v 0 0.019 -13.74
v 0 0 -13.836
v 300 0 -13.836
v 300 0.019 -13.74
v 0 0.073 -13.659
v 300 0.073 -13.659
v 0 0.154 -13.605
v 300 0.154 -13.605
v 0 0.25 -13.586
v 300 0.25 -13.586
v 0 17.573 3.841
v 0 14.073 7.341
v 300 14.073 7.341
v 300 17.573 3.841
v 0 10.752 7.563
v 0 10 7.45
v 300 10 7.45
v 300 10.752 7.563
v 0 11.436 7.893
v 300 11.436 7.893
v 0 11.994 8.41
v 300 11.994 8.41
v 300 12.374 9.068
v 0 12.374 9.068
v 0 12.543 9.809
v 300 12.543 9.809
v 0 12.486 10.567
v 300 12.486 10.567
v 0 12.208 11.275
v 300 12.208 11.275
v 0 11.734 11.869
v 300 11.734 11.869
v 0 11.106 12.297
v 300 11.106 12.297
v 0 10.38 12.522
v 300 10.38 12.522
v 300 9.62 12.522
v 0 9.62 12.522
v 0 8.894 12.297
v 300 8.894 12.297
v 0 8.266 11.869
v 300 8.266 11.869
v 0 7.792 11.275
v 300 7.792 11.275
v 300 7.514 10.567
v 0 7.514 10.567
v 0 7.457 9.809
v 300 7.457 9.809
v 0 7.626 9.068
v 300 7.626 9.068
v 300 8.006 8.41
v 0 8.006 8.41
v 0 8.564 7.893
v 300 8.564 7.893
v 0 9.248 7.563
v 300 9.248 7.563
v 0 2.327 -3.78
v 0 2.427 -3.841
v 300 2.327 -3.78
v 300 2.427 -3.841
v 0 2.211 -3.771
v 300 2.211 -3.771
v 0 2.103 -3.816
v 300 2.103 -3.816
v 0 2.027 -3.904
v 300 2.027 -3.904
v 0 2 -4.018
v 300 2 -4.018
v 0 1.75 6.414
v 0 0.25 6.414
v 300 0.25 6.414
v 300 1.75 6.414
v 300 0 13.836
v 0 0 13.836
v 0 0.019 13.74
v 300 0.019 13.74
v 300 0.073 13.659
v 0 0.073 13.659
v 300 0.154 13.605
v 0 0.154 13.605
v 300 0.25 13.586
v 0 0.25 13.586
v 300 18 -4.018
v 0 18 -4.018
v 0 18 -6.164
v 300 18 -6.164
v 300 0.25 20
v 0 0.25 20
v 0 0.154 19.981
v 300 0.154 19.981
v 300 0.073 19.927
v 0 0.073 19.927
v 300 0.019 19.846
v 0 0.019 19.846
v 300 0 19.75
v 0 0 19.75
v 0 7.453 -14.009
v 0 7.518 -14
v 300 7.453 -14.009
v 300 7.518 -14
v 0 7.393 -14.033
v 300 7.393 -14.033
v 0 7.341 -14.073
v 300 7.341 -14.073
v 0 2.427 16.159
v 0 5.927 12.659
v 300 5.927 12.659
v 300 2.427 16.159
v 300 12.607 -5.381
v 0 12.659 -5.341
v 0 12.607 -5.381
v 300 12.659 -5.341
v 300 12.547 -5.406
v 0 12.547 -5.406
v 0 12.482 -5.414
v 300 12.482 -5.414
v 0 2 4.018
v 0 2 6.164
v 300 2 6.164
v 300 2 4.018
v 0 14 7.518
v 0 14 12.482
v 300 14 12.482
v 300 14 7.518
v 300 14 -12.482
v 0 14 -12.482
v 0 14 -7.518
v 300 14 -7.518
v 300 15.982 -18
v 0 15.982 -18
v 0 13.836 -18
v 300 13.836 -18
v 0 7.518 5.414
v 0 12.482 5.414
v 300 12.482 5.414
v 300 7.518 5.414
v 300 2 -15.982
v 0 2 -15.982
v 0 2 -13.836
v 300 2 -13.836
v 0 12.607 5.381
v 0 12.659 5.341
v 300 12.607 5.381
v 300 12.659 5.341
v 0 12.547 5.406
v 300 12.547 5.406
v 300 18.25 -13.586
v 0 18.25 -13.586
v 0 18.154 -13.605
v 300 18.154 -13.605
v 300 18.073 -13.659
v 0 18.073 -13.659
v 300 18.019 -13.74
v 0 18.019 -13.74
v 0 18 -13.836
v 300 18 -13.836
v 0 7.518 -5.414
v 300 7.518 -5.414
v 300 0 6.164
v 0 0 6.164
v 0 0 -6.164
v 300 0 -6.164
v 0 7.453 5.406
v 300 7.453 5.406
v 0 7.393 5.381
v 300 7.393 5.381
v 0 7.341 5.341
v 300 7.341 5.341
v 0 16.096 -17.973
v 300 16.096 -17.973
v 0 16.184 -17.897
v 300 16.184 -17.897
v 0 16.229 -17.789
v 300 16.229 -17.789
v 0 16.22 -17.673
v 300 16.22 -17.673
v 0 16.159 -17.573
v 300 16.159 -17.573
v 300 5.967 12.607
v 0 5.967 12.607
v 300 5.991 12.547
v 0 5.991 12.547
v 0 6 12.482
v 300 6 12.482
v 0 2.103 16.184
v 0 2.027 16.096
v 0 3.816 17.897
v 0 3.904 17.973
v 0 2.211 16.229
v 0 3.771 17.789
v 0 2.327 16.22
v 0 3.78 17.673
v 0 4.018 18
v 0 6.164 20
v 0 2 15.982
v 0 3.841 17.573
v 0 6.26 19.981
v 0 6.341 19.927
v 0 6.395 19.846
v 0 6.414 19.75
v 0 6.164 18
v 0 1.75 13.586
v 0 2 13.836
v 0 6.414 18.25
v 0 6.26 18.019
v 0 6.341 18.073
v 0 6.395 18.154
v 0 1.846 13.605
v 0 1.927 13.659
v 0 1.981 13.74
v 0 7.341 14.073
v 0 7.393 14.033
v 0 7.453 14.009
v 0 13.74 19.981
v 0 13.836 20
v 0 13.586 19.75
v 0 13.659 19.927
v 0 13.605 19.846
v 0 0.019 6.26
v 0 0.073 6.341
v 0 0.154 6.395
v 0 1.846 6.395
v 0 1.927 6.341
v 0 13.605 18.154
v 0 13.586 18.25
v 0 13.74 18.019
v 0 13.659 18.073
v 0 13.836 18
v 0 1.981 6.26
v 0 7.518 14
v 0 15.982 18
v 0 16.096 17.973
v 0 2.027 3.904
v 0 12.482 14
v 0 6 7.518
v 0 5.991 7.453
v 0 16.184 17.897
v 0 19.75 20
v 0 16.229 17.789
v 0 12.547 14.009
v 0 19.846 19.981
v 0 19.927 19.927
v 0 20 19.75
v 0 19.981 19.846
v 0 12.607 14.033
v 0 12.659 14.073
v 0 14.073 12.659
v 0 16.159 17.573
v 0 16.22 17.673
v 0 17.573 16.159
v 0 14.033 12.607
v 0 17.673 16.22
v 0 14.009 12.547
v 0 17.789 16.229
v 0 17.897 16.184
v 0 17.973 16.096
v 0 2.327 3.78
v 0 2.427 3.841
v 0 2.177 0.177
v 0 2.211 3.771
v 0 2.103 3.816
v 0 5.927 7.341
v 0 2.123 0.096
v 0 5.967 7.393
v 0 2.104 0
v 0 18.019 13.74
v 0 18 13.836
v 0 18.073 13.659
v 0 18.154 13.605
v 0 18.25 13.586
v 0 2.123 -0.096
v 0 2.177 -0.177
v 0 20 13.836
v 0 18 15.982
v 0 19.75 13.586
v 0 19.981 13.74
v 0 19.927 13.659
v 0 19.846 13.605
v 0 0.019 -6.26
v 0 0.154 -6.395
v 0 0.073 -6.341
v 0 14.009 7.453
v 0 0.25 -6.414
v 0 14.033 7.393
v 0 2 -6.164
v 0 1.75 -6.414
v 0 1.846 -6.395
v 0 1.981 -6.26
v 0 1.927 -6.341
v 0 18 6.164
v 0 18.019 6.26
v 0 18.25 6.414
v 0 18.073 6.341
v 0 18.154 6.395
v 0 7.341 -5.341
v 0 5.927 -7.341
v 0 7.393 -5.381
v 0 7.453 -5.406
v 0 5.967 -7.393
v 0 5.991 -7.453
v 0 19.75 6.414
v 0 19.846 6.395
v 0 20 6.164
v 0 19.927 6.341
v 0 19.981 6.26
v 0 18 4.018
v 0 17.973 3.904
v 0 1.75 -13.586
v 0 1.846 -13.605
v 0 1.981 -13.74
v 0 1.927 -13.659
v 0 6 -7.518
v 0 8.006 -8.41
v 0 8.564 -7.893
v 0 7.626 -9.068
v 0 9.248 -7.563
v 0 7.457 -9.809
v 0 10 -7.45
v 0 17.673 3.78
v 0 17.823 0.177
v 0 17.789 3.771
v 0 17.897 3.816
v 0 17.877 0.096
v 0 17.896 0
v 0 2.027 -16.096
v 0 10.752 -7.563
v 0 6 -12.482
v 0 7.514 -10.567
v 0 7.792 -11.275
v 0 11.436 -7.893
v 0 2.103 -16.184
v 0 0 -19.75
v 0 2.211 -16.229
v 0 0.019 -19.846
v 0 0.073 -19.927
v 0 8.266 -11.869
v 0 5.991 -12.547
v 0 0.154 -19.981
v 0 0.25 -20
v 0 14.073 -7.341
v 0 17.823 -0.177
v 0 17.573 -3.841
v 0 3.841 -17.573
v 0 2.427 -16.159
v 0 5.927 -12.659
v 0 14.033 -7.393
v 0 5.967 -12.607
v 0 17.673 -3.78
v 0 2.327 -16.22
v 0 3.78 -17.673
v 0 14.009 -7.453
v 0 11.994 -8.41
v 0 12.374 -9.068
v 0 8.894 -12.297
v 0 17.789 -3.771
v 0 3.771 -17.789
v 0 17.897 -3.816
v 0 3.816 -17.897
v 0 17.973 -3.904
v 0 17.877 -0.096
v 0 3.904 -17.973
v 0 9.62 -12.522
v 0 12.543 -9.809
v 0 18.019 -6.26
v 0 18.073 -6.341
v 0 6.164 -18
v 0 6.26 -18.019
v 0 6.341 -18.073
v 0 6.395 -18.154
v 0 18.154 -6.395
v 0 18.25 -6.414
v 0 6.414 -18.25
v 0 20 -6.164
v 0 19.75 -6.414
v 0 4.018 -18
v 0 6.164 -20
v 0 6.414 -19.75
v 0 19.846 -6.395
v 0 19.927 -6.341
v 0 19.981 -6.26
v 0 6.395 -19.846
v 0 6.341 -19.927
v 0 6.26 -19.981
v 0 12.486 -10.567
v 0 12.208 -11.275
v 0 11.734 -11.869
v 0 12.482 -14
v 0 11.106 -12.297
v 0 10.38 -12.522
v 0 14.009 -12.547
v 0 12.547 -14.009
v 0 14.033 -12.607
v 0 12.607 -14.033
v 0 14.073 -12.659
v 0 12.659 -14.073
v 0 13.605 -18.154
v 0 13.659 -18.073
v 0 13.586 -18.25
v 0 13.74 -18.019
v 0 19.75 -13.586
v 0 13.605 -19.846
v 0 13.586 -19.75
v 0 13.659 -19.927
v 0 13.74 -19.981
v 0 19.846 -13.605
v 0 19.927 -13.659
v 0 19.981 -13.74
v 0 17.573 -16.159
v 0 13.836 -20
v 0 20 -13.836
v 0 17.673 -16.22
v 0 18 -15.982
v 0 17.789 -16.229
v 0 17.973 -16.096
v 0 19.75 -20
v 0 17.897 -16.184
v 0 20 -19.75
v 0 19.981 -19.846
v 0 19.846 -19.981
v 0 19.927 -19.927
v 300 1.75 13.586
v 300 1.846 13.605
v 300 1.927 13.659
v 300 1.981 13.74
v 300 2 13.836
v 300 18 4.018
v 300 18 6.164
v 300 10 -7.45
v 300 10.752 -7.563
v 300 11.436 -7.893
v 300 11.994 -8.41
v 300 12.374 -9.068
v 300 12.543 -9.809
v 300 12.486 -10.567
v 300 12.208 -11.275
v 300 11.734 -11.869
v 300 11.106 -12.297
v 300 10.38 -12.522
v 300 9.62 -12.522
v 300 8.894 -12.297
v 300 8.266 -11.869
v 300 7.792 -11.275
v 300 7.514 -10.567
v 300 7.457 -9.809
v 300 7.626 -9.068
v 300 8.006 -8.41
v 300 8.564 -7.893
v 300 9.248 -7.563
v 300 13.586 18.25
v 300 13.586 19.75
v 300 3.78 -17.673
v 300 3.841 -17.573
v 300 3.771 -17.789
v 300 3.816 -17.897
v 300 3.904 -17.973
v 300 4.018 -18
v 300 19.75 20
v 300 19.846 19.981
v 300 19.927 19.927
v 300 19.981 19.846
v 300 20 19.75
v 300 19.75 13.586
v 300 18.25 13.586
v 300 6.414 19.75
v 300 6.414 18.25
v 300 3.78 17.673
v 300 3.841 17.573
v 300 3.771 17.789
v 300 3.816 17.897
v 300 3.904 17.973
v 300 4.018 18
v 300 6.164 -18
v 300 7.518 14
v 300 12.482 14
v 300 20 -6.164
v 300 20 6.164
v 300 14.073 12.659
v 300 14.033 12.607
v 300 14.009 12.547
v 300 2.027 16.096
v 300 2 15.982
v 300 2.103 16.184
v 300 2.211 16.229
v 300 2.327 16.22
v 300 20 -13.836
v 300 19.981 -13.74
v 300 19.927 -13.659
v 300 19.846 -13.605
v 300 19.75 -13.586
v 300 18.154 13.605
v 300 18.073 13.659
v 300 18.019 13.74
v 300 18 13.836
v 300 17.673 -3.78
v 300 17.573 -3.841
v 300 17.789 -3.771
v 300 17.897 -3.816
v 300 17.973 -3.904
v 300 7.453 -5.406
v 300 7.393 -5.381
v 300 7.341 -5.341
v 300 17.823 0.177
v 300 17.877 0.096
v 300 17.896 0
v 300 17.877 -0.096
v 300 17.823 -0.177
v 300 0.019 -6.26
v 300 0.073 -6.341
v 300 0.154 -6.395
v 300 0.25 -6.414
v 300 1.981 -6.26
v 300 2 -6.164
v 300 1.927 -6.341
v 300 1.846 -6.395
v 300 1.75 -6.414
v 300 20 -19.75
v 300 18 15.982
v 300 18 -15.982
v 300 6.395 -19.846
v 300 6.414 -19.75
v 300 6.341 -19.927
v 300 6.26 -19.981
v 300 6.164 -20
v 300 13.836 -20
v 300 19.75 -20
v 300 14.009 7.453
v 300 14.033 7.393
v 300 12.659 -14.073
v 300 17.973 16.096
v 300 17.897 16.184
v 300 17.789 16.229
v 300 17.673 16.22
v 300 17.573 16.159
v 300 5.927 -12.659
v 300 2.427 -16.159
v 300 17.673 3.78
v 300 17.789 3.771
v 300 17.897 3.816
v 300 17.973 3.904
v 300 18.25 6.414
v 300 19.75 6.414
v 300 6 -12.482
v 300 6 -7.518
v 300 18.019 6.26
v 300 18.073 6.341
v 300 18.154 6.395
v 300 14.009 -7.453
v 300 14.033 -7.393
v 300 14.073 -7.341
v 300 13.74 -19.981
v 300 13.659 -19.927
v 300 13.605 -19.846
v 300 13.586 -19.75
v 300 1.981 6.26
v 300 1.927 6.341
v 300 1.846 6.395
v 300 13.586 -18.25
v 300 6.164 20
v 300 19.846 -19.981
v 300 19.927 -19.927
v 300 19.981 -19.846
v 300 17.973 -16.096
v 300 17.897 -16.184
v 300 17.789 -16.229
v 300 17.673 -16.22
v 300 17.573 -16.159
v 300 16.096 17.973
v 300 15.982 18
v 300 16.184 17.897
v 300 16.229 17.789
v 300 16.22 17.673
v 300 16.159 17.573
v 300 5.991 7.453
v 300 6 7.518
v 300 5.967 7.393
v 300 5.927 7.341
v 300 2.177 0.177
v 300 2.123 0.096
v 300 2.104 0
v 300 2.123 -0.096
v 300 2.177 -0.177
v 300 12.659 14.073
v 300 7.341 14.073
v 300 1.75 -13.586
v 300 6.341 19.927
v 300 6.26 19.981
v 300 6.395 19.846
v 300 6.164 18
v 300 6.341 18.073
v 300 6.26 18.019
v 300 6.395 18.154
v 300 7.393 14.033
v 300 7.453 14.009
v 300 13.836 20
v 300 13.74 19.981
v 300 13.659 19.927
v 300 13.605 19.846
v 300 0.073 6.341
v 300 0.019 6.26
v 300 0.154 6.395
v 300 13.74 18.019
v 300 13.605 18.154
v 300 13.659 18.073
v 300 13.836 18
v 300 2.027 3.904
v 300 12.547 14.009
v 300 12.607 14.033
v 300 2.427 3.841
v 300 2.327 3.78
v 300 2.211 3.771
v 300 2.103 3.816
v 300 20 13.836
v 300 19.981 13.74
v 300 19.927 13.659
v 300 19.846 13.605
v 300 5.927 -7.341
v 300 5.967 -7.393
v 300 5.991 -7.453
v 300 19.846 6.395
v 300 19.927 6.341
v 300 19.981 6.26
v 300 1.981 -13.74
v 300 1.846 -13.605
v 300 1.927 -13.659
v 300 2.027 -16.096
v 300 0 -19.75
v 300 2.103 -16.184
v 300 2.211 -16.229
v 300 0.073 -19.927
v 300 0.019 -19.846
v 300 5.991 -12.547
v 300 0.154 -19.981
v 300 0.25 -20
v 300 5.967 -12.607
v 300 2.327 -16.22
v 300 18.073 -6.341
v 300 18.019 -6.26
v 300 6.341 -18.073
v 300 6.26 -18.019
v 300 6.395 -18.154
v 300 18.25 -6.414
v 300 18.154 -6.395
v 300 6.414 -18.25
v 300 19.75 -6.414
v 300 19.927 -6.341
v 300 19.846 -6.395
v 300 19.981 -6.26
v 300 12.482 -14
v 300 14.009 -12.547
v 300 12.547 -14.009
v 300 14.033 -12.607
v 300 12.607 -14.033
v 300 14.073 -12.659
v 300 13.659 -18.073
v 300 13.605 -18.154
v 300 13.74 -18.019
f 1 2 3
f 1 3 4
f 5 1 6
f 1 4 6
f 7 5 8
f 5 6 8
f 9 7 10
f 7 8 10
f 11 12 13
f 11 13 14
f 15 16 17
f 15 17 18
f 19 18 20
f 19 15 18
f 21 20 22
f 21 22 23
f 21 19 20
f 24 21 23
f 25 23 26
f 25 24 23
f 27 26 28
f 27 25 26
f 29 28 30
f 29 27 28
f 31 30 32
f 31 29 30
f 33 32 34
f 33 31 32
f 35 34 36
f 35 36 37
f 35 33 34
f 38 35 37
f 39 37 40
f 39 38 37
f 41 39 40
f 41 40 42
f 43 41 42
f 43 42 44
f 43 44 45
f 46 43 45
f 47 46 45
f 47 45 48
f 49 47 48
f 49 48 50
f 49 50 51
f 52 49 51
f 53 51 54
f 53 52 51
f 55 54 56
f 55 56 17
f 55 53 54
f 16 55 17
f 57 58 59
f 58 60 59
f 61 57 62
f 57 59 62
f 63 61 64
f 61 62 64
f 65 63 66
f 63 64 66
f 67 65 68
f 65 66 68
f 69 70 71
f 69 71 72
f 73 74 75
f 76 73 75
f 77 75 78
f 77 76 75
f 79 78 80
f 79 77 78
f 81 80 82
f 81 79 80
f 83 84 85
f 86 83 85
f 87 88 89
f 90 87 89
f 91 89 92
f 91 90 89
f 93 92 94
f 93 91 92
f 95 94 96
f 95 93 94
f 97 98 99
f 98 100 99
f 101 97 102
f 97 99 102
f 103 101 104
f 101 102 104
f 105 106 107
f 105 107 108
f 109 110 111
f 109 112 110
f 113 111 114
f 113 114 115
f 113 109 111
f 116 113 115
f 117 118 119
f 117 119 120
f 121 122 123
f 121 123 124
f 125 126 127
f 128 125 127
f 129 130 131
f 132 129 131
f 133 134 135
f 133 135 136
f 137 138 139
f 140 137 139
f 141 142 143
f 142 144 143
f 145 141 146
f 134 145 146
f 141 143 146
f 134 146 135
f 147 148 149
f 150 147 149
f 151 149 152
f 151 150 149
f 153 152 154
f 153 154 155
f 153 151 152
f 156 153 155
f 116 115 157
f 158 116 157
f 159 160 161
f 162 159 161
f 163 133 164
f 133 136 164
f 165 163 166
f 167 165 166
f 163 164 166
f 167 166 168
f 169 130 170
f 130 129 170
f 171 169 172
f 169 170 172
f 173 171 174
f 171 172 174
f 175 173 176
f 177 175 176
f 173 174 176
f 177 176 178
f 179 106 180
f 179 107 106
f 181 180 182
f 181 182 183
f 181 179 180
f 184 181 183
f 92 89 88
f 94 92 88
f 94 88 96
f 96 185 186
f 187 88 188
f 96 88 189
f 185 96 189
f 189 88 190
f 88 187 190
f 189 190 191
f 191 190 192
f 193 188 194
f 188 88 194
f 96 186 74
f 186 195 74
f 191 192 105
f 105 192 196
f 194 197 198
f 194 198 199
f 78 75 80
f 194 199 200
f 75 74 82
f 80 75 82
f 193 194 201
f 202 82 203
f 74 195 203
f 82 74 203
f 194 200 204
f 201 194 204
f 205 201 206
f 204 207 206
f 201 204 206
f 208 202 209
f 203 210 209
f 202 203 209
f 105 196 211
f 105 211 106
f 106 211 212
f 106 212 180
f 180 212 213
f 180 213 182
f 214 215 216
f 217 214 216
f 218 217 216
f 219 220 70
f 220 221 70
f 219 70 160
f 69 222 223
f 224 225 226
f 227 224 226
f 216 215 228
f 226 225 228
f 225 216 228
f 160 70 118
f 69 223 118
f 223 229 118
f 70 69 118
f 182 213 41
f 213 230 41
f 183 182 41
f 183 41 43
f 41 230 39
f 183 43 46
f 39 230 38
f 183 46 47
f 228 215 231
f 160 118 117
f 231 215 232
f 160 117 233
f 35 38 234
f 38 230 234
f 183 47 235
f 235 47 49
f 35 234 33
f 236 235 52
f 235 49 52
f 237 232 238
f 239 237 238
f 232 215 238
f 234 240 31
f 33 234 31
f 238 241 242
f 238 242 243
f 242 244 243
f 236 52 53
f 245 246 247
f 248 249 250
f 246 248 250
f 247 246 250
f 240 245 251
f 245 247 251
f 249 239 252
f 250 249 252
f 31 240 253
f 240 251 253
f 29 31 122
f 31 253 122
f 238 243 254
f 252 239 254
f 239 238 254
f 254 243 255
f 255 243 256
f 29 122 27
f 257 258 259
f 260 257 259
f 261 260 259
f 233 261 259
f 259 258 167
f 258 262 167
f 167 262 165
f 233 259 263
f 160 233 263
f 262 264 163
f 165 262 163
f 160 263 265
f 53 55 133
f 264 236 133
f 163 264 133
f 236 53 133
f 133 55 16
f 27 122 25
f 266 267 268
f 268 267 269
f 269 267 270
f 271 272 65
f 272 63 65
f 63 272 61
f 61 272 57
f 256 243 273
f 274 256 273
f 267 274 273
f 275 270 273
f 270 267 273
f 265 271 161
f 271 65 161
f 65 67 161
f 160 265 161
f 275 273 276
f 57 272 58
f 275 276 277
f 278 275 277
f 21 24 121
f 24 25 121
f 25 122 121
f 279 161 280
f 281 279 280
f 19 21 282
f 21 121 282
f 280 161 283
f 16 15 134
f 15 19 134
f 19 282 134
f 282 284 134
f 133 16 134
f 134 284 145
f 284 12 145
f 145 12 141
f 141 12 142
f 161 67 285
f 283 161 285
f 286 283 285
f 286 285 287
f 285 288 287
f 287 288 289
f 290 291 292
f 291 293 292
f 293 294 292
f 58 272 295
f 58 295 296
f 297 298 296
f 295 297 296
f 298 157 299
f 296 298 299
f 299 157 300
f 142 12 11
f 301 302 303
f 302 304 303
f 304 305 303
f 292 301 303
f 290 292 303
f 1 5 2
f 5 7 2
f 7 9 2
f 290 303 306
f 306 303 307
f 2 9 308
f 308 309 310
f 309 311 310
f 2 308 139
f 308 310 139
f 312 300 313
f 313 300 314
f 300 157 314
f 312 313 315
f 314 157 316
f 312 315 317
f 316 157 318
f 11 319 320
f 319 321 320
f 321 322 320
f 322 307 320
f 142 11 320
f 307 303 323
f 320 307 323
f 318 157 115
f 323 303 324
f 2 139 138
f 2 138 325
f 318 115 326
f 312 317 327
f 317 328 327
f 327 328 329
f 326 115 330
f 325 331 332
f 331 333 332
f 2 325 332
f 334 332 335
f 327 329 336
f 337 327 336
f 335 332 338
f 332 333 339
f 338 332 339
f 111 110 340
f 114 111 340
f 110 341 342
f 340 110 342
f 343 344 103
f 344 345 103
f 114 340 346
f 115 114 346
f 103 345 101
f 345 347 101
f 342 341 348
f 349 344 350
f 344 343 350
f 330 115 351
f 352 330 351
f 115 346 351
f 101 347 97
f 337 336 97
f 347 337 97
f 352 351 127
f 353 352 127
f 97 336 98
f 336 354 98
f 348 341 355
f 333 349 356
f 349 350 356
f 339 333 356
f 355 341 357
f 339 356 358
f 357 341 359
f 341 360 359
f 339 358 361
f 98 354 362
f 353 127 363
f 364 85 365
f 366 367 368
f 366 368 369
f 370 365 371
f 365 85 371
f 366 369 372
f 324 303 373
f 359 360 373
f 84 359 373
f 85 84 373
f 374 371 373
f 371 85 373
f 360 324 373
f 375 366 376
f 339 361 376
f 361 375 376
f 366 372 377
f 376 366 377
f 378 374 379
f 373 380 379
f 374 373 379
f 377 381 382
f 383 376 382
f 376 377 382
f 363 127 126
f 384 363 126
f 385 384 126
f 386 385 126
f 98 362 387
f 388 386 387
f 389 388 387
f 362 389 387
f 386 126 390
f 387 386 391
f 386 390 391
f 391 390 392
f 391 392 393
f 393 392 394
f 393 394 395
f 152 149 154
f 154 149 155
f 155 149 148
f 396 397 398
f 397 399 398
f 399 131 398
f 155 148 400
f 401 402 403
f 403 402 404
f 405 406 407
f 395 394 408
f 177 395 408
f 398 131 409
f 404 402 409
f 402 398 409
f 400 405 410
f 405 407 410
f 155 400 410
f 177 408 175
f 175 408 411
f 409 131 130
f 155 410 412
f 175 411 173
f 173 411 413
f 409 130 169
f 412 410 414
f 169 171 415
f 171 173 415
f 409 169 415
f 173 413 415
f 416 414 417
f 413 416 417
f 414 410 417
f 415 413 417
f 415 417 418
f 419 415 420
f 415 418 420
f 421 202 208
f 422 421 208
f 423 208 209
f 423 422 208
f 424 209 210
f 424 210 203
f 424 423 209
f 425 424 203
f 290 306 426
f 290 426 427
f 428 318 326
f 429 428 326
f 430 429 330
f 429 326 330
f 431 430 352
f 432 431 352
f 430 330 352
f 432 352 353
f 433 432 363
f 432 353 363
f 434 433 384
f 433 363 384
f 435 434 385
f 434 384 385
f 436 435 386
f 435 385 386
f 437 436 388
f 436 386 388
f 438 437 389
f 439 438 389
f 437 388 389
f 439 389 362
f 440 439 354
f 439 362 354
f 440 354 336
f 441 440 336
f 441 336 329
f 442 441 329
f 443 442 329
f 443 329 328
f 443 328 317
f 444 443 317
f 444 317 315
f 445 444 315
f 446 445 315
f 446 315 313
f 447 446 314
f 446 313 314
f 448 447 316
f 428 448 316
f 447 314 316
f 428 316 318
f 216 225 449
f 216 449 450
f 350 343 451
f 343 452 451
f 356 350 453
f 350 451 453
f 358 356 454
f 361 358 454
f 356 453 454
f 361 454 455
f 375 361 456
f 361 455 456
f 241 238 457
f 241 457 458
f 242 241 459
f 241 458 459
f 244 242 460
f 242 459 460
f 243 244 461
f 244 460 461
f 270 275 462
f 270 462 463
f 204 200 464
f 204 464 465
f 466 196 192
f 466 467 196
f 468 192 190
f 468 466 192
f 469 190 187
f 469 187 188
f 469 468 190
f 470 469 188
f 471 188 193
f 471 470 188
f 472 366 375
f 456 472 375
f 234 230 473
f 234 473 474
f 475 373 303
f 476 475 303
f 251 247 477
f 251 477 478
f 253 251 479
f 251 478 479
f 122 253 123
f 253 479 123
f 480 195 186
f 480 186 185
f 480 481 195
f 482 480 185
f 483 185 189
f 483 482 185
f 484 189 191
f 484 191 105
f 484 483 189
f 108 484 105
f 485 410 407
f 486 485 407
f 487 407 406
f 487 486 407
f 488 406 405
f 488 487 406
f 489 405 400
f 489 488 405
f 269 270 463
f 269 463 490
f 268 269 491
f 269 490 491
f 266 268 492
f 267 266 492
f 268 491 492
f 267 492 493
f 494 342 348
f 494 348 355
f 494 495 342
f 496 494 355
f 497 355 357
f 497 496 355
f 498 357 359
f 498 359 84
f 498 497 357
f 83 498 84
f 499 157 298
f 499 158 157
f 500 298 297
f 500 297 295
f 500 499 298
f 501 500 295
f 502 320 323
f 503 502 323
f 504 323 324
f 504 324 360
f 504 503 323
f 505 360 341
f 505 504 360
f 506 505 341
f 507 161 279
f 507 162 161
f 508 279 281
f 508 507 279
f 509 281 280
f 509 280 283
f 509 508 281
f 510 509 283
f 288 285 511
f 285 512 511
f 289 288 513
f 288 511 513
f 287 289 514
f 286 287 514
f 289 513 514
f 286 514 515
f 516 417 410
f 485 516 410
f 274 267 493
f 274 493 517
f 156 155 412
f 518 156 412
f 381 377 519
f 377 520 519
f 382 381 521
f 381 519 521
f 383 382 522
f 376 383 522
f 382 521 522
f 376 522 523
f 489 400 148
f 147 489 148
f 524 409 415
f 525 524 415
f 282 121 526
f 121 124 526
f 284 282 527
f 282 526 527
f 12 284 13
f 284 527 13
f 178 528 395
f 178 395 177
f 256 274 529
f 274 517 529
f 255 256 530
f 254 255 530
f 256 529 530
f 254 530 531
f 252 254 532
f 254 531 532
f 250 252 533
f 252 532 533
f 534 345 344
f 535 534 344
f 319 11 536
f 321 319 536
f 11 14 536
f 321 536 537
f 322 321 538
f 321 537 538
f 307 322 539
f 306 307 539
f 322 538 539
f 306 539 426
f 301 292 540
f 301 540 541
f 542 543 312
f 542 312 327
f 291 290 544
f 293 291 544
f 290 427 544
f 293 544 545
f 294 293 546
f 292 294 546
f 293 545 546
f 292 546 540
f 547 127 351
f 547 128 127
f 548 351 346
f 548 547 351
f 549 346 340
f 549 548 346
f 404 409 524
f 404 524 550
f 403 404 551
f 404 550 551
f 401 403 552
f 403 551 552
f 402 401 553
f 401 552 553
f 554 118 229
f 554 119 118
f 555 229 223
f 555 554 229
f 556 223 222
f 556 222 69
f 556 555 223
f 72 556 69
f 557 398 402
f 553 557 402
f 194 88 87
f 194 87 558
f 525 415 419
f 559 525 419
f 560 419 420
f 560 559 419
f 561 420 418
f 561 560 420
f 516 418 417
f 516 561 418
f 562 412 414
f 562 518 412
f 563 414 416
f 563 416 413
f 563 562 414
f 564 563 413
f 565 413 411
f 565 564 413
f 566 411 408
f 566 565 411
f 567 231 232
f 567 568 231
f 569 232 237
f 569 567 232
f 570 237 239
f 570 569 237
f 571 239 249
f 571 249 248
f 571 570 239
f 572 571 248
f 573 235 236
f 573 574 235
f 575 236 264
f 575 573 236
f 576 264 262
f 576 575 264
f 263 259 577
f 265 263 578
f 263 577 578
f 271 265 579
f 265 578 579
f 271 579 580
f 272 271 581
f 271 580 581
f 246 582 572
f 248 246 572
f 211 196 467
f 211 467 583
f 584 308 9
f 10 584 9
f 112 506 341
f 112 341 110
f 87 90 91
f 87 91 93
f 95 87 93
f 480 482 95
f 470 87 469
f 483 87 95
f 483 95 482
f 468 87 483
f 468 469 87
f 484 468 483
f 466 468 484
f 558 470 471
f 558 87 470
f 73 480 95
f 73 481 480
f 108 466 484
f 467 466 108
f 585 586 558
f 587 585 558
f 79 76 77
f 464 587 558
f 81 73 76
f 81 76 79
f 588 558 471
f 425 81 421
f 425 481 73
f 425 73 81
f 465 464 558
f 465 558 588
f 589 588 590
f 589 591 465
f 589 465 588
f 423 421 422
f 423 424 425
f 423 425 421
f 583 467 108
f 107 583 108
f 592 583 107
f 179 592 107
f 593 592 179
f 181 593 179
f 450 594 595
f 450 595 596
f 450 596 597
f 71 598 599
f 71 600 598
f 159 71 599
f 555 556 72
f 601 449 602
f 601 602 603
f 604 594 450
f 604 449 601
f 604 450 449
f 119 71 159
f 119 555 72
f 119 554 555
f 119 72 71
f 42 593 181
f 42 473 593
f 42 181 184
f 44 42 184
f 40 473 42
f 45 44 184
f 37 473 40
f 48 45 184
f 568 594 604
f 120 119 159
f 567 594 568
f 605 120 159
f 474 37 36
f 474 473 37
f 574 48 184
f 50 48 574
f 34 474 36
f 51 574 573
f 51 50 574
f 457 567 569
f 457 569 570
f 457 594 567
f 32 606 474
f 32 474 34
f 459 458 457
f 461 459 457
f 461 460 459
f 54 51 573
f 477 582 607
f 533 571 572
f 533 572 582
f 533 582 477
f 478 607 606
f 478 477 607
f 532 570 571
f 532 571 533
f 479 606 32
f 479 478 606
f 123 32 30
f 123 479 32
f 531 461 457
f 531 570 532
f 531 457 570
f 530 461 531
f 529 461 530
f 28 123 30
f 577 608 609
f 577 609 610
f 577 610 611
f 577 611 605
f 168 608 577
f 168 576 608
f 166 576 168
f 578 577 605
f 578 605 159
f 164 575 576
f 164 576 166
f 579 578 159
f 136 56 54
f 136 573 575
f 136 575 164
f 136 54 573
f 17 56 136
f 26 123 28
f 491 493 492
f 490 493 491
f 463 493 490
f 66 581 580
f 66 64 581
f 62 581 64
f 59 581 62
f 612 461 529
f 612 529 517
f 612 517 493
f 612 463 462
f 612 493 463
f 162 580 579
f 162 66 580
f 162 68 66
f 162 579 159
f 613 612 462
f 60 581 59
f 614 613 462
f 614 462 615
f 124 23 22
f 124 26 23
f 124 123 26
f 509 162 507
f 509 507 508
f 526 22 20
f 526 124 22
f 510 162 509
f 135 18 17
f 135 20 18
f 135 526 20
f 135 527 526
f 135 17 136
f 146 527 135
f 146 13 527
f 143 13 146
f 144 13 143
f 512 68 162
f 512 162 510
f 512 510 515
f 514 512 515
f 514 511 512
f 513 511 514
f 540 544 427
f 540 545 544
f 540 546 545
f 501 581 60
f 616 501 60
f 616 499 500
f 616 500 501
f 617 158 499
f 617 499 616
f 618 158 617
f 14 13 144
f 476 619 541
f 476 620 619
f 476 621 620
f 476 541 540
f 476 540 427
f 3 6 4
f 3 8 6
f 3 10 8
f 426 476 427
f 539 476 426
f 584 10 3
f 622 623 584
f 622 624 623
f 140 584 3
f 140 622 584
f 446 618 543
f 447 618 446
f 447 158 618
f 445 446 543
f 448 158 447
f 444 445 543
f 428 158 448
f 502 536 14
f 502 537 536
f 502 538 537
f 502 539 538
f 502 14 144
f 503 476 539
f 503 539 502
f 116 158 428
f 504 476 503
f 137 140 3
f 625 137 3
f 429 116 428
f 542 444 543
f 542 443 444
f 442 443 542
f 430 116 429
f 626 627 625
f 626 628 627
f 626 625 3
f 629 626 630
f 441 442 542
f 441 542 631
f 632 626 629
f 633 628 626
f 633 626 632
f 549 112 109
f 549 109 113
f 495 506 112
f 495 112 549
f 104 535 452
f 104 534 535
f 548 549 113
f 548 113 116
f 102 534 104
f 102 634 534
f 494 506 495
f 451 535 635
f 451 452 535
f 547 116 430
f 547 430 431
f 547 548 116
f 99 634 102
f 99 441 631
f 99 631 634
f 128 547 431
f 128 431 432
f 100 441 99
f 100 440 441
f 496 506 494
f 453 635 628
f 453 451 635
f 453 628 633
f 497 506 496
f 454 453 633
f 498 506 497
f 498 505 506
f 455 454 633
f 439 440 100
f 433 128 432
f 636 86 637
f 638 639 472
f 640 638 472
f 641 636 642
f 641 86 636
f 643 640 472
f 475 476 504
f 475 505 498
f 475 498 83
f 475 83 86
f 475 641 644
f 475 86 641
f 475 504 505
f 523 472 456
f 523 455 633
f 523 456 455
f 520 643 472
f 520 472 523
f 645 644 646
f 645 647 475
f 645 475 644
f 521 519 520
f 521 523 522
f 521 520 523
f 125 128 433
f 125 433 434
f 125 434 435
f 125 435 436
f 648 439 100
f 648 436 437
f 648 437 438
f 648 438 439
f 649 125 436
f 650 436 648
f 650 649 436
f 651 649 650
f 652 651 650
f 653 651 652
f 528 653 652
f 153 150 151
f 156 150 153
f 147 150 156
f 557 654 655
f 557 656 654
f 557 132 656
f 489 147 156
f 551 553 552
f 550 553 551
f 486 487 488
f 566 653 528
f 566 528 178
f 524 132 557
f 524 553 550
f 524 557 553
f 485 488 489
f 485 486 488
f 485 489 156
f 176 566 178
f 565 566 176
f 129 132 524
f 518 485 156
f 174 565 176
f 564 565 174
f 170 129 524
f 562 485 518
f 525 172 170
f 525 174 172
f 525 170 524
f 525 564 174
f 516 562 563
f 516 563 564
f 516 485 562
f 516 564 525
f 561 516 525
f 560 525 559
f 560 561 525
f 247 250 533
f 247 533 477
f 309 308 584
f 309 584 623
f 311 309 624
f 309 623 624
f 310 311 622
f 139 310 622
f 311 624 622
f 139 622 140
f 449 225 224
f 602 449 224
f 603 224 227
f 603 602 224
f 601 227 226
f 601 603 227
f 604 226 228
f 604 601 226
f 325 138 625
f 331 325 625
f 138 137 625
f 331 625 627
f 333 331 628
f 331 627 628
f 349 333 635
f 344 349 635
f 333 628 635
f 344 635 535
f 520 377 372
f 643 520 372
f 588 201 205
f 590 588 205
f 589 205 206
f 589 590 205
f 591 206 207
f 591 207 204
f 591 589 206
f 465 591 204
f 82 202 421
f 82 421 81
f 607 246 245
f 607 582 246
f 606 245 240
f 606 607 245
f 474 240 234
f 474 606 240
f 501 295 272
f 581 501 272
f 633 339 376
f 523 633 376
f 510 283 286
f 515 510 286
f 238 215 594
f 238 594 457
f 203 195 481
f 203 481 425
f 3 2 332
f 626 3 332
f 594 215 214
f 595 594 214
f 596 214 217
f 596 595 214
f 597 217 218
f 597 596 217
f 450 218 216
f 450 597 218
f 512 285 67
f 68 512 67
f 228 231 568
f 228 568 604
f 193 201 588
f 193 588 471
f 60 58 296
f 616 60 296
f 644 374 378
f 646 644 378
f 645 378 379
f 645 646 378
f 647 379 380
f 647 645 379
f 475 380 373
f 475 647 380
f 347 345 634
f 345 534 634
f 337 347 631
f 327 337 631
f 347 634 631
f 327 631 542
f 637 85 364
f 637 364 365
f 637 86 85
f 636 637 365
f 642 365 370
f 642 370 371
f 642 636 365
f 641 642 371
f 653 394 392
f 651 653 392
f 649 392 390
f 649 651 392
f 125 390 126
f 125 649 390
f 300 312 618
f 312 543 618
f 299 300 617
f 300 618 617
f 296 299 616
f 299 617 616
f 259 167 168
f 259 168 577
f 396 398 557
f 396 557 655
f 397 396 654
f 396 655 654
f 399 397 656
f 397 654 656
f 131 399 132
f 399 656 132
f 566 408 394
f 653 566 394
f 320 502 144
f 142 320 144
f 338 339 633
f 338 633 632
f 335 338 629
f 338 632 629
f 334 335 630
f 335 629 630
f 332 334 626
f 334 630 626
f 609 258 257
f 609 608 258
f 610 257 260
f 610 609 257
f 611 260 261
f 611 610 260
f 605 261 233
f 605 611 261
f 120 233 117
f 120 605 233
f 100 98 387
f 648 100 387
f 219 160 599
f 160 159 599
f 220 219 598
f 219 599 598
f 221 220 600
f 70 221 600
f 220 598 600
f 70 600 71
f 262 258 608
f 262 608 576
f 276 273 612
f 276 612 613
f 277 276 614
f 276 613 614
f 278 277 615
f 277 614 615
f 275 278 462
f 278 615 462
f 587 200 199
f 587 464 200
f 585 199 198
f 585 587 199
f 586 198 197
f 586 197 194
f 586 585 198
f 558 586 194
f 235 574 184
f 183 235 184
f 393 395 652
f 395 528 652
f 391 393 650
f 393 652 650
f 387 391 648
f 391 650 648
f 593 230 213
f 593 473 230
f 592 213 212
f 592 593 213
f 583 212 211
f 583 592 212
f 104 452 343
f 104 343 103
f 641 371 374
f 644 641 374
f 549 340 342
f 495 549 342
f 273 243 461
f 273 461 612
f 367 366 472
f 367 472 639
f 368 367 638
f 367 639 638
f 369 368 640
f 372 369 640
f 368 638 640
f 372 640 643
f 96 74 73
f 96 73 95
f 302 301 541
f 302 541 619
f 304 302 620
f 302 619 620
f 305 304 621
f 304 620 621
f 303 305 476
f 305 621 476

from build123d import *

# Parameters (mm, degrees)
SKETCH2_R           = 2.55
BOSS_EXTRUDE2_DEPTH = 300
FILLET1_R           = 0.25
FILLET2_R           = 0.25


with BuildPart() as part:
    # Sketch2 → Boss-Extrude2 (new body)
    with BuildSketch(Plane(origin=(0, 0, 0), x_dir=(0, 0, -1), z_dir=(1, 0, 0))):
        Polygon((-20, 13.585786438), (-20, 20), (-13.585786438, 20), (-13.585786438, 18), (-16.585786438, 18), (-12.58578916, 14), (-7.41421084, 14), (-3.414213562, 18), (-6.414213562, 18), (-6.414213562, 20), (0, 20), (0, 18), (-5.414207154, 12.58578916), (-5.414207154, 7.41421084), (0, 2), (0, 0), (-6.414213562, 0), (-6.414213562, 2), (-3.414213562, 2), (-7.41421084, 6), (-12.58578916, 6), (-16.585786438, 2), (-13.585786438, 2), (-13.585786438, 0), (-20, 0), (-20, 6.414213562), (-18, 6.414213562), (-18, 3.414213562), (-14.000005445, 7.41421084), (-14.000005445, 12.58578916), (-18, 16.585786438), (-18, 13.585786438), align=None)
        with Locations((-10, 10)):
            Circle(SKETCH2_R, mode=Mode.SUBTRACT)
    extrude(amount=BOSS_EXTRUDE2_DEPTH)

    # Fillet1
    fillet1_edges = [part.edges().sort_by_distance(p)[0] for p in [
        (150, 13.585786438, 20),
        (150, 20, 20),
        (150, 20, 13.585786438),
        (150, 18, 13.585786438),
        (150, 18, 16.585786438),
        (150, 14, 12.58578916),
        (150, 14, 7.41421084),
        (150, 18, 3.414213562),
        (150, 18, 6.414213562),
        (150, 20, 6.414213562),
        (150, 12.58578916, 5.414207154),
        (150, 7.41421084, 5.414207154),
        (150, 0, 6.414213562),
        (150, 2, 6.414213562),
        (150, 2, 3.414213562),
        (150, 6, 7.41421084),
        (150, 6, 12.58578916),
        (150, 2, 16.585786438),
        (150, 2, 13.585786438),
        (150, 0, 13.585786438),
        (150, 0, 20),
        (150, 6.414213562, 20),
        (150, 6.414213562, 18),
        (150, 3.414213562, 18),
        (150, 7.41421084, 14.000005445),
        (150, 12.58578916, 14.000005445),
        (150, 16.585786438, 18),
        (150, 13.585786438, 18),
    ]]
    fillet(fillet1_edges, radius=FILLET1_R)

    # Mirror3: part across plane


with BuildPart() as part_1:
    add(part.part)
    add(part.part.mirror(Plane(origin=(300, 20, 0), x_dir=(1, 0, 0), z_dir=(0, 0, 1))))

    # Fillet2
    fillet2_edges = [part_1.edges().sort_by_distance(p)[0] for p in [
        (150, 2, 0),
        (150, 18, 0),
    ]]
    fillet(fillet2_edges, radius=FILLET2_R)


solid = part_1.part
